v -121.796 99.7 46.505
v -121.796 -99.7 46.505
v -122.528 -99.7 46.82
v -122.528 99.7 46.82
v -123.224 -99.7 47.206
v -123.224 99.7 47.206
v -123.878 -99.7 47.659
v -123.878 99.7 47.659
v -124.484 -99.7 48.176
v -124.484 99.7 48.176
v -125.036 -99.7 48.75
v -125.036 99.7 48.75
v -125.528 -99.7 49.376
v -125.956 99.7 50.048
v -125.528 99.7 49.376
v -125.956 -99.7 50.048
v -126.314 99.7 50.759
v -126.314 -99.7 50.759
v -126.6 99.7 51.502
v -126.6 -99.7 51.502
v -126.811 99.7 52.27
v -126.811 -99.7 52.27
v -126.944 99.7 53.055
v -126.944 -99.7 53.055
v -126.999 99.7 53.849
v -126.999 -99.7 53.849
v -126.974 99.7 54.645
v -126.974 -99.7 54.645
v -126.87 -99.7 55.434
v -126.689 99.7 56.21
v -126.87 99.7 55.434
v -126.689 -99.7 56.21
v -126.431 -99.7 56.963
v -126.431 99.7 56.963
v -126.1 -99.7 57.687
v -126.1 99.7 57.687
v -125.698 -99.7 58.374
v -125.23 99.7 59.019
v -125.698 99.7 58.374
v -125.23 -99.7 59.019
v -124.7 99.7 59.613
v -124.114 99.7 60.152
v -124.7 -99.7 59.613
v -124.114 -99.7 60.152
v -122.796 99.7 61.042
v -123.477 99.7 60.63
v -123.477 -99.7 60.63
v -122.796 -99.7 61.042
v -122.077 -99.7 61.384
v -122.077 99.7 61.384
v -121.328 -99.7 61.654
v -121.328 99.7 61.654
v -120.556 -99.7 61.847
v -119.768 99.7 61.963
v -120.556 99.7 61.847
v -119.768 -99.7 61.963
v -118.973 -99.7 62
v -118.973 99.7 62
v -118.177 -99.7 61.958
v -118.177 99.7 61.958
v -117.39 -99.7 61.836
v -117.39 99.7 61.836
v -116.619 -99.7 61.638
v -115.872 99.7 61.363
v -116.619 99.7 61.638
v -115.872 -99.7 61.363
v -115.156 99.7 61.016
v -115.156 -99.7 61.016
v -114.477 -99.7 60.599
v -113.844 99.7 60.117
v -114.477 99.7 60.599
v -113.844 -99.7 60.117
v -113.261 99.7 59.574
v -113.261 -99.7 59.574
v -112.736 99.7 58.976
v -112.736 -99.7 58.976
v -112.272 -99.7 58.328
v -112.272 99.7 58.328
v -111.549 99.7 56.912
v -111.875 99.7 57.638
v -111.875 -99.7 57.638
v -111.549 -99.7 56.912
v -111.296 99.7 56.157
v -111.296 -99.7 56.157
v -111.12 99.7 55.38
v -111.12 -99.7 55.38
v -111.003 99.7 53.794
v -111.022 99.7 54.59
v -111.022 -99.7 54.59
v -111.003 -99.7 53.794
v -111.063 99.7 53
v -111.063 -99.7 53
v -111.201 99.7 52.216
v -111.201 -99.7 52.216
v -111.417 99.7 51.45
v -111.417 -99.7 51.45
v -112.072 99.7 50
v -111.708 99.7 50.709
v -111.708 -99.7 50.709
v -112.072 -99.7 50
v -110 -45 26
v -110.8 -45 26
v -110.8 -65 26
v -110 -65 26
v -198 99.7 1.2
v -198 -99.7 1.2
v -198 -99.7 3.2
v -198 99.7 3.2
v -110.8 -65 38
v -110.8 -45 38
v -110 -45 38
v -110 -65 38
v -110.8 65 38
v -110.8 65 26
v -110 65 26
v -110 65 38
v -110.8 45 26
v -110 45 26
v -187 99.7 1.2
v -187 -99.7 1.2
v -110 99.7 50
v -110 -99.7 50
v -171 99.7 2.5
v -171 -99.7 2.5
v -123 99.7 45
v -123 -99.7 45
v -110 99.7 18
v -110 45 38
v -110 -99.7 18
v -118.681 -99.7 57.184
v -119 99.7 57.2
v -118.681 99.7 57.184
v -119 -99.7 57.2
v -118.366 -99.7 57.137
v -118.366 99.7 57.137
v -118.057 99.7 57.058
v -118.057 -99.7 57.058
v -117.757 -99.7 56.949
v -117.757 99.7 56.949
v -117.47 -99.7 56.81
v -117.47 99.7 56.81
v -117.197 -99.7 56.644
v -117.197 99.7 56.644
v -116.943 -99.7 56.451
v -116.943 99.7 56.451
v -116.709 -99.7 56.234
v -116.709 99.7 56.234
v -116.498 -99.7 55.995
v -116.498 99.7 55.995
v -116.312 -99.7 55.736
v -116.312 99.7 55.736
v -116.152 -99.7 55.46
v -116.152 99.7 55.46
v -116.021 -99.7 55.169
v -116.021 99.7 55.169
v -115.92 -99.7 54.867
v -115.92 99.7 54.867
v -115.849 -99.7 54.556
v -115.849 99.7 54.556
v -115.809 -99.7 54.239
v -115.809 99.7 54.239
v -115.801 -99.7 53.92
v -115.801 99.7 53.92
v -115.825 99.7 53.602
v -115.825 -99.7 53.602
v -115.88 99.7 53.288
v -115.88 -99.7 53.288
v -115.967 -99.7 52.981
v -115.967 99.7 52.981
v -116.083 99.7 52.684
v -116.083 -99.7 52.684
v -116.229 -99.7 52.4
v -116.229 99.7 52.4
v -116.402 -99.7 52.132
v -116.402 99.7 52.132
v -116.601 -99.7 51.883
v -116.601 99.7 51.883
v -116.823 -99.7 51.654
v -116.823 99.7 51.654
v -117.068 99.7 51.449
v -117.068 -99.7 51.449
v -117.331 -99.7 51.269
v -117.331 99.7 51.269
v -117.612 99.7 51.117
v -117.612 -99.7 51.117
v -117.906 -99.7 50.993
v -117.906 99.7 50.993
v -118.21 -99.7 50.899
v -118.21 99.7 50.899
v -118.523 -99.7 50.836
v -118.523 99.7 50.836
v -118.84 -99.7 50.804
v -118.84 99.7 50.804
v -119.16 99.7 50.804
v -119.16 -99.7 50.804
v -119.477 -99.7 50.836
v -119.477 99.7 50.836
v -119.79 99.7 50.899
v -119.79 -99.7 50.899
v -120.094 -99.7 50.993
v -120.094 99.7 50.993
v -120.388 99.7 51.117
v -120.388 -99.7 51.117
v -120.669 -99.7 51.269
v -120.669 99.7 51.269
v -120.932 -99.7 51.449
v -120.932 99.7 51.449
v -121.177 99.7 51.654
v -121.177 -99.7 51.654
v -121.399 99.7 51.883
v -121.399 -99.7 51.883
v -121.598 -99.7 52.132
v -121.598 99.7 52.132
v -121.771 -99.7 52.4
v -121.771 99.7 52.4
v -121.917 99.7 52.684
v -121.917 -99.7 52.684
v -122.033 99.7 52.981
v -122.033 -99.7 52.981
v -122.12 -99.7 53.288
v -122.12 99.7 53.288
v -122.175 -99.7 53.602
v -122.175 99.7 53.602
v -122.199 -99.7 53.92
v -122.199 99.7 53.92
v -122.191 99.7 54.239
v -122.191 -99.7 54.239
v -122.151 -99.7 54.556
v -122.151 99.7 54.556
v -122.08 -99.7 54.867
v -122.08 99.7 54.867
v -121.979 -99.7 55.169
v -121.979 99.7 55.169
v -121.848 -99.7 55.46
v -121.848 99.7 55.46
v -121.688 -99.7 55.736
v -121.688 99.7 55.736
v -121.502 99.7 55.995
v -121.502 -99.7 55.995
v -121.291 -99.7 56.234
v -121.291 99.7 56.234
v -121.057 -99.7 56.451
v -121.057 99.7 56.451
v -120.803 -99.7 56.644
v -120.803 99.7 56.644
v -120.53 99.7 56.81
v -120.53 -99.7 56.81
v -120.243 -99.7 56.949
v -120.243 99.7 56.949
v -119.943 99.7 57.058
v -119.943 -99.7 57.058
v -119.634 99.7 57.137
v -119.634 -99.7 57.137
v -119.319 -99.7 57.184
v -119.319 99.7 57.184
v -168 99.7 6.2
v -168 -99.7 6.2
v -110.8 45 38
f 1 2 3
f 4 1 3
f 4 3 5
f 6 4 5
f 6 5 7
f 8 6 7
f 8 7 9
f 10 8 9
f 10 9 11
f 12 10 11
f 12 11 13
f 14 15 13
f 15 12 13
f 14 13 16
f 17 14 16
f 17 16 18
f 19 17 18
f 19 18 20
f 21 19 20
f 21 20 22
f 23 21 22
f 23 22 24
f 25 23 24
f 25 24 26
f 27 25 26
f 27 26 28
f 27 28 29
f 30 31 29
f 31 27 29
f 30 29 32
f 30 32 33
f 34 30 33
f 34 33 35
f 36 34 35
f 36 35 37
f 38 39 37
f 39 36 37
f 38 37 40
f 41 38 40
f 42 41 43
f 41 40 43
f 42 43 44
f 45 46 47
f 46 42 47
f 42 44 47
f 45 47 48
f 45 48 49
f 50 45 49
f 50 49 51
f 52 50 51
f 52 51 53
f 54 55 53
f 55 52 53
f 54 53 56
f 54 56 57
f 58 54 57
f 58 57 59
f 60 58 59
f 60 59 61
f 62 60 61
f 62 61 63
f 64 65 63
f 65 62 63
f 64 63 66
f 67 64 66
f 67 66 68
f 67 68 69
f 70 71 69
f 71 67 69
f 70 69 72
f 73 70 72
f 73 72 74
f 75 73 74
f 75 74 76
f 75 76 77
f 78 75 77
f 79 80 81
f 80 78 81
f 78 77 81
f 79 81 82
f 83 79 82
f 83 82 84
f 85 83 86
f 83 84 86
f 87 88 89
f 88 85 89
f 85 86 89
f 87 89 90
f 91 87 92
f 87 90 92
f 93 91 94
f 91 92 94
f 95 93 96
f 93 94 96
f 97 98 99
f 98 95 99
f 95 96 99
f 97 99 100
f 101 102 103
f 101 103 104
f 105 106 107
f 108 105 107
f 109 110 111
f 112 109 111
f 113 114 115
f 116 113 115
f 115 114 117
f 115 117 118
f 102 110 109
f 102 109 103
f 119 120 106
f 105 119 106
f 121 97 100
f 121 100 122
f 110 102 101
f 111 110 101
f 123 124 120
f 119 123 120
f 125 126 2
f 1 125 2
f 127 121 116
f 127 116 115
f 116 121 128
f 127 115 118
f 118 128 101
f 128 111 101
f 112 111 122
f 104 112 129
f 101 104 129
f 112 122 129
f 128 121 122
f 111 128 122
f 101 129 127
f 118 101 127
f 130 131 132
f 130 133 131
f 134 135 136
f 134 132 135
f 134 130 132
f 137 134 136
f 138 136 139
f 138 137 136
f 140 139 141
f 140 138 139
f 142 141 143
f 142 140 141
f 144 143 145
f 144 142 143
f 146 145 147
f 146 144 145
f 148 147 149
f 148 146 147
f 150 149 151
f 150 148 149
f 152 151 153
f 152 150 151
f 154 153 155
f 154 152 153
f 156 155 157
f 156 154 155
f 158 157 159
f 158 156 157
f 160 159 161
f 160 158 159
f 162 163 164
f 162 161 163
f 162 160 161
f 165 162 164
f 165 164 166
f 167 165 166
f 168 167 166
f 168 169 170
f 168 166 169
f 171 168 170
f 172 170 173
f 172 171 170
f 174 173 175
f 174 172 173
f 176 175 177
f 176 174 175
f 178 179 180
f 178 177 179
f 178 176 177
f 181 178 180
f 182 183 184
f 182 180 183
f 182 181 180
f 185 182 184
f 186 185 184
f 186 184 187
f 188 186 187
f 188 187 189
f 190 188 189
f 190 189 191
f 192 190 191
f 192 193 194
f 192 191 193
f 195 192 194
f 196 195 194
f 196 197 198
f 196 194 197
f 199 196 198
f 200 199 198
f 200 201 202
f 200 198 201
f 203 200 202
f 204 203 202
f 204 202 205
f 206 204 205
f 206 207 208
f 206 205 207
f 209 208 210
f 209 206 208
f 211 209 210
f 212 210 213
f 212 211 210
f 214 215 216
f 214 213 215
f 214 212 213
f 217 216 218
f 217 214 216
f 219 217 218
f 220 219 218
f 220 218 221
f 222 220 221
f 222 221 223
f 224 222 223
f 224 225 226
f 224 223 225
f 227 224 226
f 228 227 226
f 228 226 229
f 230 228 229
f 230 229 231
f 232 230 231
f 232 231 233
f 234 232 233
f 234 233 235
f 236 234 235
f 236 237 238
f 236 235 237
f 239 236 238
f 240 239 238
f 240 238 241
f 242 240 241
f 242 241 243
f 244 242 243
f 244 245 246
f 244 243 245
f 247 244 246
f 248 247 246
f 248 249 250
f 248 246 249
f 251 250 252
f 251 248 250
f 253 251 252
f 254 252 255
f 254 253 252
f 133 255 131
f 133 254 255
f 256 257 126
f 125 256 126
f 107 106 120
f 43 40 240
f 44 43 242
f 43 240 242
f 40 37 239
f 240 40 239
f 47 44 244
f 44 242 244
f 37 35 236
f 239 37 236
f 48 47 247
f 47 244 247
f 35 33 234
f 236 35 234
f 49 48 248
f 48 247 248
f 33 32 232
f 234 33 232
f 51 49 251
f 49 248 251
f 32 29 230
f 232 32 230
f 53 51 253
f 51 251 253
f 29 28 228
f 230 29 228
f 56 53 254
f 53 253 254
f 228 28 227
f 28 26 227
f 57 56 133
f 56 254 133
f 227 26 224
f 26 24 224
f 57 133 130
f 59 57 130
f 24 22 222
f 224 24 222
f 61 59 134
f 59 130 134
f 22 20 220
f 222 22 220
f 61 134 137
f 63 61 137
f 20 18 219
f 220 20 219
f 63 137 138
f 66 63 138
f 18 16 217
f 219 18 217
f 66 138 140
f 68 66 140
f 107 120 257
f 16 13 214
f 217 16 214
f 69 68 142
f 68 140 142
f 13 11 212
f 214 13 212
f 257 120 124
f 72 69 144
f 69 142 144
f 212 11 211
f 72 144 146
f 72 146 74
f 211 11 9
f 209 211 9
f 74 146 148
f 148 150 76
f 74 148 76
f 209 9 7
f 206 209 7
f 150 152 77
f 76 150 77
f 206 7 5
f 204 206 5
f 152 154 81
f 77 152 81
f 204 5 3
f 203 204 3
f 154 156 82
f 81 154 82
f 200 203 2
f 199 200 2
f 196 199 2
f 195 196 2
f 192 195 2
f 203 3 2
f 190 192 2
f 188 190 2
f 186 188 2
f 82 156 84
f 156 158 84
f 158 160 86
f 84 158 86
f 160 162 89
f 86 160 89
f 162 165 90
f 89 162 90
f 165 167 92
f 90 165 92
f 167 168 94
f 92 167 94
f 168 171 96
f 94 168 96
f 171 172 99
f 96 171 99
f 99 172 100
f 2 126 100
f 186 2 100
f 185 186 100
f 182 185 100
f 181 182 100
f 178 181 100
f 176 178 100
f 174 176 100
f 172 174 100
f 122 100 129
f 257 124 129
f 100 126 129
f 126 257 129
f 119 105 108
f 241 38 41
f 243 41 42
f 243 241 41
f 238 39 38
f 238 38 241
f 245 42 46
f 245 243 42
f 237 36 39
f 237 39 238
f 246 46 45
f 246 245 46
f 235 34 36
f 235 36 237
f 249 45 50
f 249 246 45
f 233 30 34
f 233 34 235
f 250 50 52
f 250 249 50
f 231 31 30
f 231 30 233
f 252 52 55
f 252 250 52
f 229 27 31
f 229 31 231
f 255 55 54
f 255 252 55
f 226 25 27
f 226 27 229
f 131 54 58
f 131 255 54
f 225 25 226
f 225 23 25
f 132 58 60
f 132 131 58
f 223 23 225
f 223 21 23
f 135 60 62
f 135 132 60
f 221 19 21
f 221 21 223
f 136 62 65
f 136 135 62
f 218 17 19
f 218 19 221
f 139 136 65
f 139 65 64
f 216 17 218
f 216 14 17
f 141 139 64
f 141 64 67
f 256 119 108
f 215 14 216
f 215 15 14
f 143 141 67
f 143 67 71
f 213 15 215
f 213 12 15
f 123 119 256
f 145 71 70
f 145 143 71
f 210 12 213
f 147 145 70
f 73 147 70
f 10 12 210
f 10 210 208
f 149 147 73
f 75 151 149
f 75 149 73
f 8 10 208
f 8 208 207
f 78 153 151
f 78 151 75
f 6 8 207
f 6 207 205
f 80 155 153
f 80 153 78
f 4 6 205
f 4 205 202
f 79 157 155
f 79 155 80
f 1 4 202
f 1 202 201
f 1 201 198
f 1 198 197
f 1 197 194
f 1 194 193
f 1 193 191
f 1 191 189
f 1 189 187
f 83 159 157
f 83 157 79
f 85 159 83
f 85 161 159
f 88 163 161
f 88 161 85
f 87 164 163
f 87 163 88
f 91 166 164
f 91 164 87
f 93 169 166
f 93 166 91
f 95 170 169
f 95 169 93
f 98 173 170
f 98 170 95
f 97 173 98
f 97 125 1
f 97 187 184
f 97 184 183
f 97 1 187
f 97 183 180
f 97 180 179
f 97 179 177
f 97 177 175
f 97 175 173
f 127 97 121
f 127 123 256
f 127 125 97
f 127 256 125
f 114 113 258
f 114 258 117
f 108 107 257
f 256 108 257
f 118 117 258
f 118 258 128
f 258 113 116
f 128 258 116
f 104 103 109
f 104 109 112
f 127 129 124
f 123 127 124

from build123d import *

# Parameters (mm, degrees)
ONE_PIECE_PROGRESSIVE_SOLID_WEDGE_DEPTH      = 99.7
ONE_PIECE_PROGRESSIVE_SOLID_WEDGE_DEPTH_BACK = 99.7
INTEGRAL_FULL_WIDTH_PIVOT_BOSS_DEPTH         = 99.7
INTEGRAL_FULL_WIDTH_PIVOT_BOSS_DEPTH_BACK    = 99.7
SKETCH_2_R                                   = 8
M6_MANUAL_PIVOT_DEPTH                        = 110
M6_MANUAL_PIVOT_DEPTH_BACK                   = 110
SKETCH_3_R                                   = 3.2
RECESSED_HOOK_PATCH_65_START                 = -45
SKETCH_4_W                                   = 0.81
SKETCH_4_H                                   = 12
RECESSED_HOOK_PATCH_65_DEPTH                 = 20
RECESSED_HOOK_PATCH_45_START                 = 65
SKETCH_5_W                                   = 0.81
SKETCH_5_H                                   = 12
RECESSED_HOOK_PATCH_45_DEPTH                 = 20


with BuildPart() as part:
    # 草图1 → One_piece_progressive_solid_wedge (new, two sides: drawn at the far end of the back side and taken through both)
    with BuildSketch(Plane(origin=(0, 0, 0), x_dir=(1, 0, 0), z_dir=(0, 1, 0)).offset(-ONE_PIECE_PROGRESSIVE_SOLID_WEDGE_DEPTH_BACK)):
        Polygon((-198, -1.2), (-198, -3.2), (-168, -6.2), (-123, -45), (-119, -50), (-110, -50), (-110, -18), (-171, -2.5), (-187, -1.2), align=None)
    extrude(amount=ONE_PIECE_PROGRESSIVE_SOLID_WEDGE_DEPTH + ONE_PIECE_PROGRESSIVE_SOLID_WEDGE_DEPTH_BACK)

    # 草图2 → Integral_full_width_pivot_boss (add, two sides: drawn at the far end of the back side and taken through both)
    with BuildSketch(Plane(origin=(0, 0, 0), x_dir=(1, 0, 0), z_dir=(0, 1, 0)).offset(-INTEGRAL_FULL_WIDTH_PIVOT_BOSS_DEPTH_BACK)):
        with Locations((-119, -54)):
            Circle(SKETCH_2_R)
    extrude(amount=INTEGRAL_FULL_WIDTH_PIVOT_BOSS_DEPTH + INTEGRAL_FULL_WIDTH_PIVOT_BOSS_DEPTH_BACK)

    # 草图3 → M6_manual_pivot (cut, two sides: drawn at the far end of the back side and taken through both)
    with BuildSketch(Plane(origin=(0, 0, 0), x_dir=(1, 0, 0), z_dir=(0, 1, 0)).offset(-M6_MANUAL_PIVOT_DEPTH_BACK)):
        with Locations((-119, -54)):
            Circle(SKETCH_3_R)
    extrude(amount=M6_MANUAL_PIVOT_DEPTH + M6_MANUAL_PIVOT_DEPTH_BACK, mode=Mode.SUBTRACT)

    # 草图4 → Recessed_hook_patch_-65 (cut)
    with BuildSketch(Plane(origin=(0, 0, 0), x_dir=(1, 0, 0), z_dir=(0, 1, 0)).offset(RECESSED_HOOK_PATCH_65_START)):
        with Locations((-110.395, -32)):
            Rectangle(SKETCH_4_W, SKETCH_4_H)
    extrude(amount=-RECESSED_HOOK_PATCH_65_DEPTH, mode=Mode.SUBTRACT)

    # 草图5 → Recessed_hook_patch_45 (cut)
    with BuildSketch(Plane(origin=(0, 0, 0), x_dir=(1, 0, 0), z_dir=(0, 1, 0)).offset(RECESSED_HOOK_PATCH_45_START)):
        with Locations((-110.395, -32)):
            Rectangle(SKETCH_5_W, SKETCH_5_H)
    extrude(amount=-RECESSED_HOOK_PATCH_45_DEPTH, mode=Mode.SUBTRACT)


solid = part.part
